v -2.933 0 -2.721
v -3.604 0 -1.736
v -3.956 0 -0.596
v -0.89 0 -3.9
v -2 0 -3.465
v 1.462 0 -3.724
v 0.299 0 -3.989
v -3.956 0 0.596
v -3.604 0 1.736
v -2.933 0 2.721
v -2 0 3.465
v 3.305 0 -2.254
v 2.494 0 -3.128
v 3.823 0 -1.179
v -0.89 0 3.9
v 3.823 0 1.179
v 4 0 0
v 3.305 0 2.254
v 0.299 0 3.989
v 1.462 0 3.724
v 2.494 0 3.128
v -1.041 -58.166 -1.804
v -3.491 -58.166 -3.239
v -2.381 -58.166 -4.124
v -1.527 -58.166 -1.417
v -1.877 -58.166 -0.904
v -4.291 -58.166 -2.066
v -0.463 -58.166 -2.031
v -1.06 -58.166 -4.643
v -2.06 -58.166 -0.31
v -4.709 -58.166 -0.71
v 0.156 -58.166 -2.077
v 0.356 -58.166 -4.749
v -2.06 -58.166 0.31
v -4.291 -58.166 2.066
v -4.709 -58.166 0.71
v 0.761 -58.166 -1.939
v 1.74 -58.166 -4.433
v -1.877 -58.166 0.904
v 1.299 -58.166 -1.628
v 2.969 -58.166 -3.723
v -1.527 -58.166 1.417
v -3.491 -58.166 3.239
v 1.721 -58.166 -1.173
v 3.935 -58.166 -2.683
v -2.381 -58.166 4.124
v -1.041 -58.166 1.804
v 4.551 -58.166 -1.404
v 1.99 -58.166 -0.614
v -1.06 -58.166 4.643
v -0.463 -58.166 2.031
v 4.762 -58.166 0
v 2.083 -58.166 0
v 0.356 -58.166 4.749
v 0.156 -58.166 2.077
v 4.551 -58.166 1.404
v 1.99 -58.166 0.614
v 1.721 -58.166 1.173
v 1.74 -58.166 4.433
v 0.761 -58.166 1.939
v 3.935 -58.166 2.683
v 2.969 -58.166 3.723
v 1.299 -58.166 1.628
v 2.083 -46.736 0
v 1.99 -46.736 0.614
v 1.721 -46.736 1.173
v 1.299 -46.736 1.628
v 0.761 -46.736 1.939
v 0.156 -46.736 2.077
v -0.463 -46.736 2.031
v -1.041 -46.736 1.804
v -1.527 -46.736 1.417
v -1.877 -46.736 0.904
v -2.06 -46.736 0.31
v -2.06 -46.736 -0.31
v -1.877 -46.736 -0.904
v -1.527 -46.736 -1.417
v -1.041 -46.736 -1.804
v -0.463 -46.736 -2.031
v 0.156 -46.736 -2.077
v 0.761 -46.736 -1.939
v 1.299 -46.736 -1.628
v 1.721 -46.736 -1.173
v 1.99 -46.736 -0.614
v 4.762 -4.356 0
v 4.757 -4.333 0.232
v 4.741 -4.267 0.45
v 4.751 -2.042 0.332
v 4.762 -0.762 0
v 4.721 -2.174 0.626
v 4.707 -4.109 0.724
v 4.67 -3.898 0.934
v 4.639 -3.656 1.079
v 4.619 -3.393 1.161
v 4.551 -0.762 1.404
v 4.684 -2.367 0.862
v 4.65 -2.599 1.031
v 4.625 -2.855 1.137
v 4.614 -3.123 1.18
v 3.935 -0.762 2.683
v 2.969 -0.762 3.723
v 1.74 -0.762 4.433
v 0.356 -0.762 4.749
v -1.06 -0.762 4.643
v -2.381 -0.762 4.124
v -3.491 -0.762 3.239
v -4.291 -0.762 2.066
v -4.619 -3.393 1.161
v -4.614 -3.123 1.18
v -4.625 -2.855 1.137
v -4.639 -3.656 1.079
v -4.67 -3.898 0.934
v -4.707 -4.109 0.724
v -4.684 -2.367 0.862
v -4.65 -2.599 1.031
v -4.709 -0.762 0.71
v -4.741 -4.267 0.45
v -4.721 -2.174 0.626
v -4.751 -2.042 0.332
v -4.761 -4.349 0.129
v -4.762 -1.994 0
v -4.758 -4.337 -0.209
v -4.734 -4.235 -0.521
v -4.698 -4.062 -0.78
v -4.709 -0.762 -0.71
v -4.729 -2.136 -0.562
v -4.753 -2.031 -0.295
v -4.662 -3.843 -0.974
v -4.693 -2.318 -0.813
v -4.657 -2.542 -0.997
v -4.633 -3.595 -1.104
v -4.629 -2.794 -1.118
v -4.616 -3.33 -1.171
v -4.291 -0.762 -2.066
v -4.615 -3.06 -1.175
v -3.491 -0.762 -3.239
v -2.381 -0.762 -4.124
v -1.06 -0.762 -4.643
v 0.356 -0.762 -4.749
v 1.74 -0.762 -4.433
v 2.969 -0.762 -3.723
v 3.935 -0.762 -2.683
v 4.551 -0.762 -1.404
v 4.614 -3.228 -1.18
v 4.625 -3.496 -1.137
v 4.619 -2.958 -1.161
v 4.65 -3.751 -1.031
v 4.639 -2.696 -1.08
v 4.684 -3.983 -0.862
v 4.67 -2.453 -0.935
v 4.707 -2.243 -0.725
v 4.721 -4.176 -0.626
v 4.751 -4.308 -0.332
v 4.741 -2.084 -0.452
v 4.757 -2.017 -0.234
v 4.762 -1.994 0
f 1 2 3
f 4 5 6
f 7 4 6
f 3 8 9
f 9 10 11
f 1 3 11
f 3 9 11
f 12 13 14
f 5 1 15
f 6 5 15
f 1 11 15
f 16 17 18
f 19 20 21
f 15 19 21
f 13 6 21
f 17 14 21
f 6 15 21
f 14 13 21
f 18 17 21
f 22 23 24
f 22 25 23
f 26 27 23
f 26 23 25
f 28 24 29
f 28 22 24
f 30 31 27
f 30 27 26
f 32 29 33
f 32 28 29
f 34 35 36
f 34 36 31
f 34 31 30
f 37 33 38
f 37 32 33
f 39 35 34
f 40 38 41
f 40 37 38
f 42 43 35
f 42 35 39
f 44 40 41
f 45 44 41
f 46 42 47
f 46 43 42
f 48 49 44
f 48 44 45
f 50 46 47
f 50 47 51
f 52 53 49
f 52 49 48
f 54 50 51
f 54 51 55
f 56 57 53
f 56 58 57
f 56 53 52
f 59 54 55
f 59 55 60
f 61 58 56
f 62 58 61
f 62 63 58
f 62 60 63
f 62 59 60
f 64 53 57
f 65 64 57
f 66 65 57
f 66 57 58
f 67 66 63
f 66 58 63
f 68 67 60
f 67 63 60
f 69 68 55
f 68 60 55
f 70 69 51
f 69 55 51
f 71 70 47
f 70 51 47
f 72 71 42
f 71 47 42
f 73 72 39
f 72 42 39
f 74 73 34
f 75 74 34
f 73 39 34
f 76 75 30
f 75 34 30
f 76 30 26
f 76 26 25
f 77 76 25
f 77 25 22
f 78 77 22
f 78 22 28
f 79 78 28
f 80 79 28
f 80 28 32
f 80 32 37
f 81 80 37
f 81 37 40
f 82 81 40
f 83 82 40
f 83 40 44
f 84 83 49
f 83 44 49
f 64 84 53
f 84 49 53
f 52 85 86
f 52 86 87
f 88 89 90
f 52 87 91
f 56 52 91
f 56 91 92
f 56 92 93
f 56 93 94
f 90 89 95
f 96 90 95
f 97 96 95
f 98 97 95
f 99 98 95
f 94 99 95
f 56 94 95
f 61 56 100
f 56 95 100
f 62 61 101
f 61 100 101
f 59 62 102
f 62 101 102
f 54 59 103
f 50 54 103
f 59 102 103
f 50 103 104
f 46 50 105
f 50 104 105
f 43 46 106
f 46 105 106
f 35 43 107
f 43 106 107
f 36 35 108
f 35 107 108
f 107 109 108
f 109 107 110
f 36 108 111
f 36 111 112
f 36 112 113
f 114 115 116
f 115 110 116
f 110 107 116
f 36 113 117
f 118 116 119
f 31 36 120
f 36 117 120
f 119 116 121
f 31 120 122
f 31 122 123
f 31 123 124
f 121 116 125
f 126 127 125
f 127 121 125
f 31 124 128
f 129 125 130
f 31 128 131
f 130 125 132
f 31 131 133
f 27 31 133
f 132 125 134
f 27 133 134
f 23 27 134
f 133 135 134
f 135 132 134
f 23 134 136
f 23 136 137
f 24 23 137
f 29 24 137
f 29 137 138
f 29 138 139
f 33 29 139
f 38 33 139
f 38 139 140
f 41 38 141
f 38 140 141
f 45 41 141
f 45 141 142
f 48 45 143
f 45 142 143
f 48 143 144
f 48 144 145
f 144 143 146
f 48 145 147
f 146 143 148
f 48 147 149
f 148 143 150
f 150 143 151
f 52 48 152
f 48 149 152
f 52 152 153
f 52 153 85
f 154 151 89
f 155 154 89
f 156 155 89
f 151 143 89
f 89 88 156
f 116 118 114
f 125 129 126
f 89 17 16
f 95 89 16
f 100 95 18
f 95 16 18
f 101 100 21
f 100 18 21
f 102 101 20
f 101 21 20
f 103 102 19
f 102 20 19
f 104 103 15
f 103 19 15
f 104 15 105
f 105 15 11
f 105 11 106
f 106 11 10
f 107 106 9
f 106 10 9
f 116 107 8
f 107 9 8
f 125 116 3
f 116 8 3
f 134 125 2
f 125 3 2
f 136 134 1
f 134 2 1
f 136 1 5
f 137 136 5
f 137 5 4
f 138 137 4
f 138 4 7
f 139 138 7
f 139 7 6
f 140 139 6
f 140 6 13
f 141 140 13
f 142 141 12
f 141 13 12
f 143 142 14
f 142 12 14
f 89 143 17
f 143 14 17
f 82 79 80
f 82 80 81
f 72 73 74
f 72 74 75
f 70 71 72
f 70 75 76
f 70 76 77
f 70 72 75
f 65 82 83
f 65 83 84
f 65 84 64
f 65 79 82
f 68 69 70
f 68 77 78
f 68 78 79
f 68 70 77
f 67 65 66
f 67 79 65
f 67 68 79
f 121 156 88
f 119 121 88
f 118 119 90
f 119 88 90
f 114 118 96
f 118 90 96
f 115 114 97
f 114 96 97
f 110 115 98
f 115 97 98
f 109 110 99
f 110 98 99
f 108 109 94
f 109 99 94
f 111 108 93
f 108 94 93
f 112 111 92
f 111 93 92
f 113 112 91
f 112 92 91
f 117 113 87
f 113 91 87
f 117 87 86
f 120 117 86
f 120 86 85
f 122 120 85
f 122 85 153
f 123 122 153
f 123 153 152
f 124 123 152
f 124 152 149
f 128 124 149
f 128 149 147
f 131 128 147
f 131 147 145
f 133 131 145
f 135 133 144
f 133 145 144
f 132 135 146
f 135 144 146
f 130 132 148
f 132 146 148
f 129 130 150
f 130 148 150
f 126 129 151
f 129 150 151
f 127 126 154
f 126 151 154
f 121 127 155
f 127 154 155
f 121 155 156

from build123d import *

# Parameters (mm, degrees)
F0_R     = 4.7625
F1_DEPTH = 58.166
F2_R     = 2.0828
F3_DEPTH = 11.43
F5_R     = 1.1811
F6_DEPTH = 10.16
F7_SIZE  = 0.762


with BuildPart() as f1:
    # F0 (on Front) → F1 (new body)
    with BuildSketch(Plane.XZ):
        Circle(F0_R)
    extrude(amount=F1_DEPTH)

    # F2 (on face) → F3 (cut)
    with BuildSketch(Plane.XZ.offset(58.166)):
        Circle(F2_R)
    extrude(amount=-F3_DEPTH, mode=Mode.SUBTRACT)

    # F5 (on offset) → F6 (cut)
    with BuildSketch(Plane.YZ.offset(4.7879)):
        with Locations((-3.175, 0)):
            Circle(F5_R)
    extrude(amount=-F6_DEPTH, mode=Mode.SUBTRACT)

    # F7
    f7_edges = [f1.edges().sort_by_distance(p)[0] for p in [
        (-4.7625, 0, 0),
    ]]
    chamfer(f7_edges, length=F7_SIZE)


solid = f1.part
